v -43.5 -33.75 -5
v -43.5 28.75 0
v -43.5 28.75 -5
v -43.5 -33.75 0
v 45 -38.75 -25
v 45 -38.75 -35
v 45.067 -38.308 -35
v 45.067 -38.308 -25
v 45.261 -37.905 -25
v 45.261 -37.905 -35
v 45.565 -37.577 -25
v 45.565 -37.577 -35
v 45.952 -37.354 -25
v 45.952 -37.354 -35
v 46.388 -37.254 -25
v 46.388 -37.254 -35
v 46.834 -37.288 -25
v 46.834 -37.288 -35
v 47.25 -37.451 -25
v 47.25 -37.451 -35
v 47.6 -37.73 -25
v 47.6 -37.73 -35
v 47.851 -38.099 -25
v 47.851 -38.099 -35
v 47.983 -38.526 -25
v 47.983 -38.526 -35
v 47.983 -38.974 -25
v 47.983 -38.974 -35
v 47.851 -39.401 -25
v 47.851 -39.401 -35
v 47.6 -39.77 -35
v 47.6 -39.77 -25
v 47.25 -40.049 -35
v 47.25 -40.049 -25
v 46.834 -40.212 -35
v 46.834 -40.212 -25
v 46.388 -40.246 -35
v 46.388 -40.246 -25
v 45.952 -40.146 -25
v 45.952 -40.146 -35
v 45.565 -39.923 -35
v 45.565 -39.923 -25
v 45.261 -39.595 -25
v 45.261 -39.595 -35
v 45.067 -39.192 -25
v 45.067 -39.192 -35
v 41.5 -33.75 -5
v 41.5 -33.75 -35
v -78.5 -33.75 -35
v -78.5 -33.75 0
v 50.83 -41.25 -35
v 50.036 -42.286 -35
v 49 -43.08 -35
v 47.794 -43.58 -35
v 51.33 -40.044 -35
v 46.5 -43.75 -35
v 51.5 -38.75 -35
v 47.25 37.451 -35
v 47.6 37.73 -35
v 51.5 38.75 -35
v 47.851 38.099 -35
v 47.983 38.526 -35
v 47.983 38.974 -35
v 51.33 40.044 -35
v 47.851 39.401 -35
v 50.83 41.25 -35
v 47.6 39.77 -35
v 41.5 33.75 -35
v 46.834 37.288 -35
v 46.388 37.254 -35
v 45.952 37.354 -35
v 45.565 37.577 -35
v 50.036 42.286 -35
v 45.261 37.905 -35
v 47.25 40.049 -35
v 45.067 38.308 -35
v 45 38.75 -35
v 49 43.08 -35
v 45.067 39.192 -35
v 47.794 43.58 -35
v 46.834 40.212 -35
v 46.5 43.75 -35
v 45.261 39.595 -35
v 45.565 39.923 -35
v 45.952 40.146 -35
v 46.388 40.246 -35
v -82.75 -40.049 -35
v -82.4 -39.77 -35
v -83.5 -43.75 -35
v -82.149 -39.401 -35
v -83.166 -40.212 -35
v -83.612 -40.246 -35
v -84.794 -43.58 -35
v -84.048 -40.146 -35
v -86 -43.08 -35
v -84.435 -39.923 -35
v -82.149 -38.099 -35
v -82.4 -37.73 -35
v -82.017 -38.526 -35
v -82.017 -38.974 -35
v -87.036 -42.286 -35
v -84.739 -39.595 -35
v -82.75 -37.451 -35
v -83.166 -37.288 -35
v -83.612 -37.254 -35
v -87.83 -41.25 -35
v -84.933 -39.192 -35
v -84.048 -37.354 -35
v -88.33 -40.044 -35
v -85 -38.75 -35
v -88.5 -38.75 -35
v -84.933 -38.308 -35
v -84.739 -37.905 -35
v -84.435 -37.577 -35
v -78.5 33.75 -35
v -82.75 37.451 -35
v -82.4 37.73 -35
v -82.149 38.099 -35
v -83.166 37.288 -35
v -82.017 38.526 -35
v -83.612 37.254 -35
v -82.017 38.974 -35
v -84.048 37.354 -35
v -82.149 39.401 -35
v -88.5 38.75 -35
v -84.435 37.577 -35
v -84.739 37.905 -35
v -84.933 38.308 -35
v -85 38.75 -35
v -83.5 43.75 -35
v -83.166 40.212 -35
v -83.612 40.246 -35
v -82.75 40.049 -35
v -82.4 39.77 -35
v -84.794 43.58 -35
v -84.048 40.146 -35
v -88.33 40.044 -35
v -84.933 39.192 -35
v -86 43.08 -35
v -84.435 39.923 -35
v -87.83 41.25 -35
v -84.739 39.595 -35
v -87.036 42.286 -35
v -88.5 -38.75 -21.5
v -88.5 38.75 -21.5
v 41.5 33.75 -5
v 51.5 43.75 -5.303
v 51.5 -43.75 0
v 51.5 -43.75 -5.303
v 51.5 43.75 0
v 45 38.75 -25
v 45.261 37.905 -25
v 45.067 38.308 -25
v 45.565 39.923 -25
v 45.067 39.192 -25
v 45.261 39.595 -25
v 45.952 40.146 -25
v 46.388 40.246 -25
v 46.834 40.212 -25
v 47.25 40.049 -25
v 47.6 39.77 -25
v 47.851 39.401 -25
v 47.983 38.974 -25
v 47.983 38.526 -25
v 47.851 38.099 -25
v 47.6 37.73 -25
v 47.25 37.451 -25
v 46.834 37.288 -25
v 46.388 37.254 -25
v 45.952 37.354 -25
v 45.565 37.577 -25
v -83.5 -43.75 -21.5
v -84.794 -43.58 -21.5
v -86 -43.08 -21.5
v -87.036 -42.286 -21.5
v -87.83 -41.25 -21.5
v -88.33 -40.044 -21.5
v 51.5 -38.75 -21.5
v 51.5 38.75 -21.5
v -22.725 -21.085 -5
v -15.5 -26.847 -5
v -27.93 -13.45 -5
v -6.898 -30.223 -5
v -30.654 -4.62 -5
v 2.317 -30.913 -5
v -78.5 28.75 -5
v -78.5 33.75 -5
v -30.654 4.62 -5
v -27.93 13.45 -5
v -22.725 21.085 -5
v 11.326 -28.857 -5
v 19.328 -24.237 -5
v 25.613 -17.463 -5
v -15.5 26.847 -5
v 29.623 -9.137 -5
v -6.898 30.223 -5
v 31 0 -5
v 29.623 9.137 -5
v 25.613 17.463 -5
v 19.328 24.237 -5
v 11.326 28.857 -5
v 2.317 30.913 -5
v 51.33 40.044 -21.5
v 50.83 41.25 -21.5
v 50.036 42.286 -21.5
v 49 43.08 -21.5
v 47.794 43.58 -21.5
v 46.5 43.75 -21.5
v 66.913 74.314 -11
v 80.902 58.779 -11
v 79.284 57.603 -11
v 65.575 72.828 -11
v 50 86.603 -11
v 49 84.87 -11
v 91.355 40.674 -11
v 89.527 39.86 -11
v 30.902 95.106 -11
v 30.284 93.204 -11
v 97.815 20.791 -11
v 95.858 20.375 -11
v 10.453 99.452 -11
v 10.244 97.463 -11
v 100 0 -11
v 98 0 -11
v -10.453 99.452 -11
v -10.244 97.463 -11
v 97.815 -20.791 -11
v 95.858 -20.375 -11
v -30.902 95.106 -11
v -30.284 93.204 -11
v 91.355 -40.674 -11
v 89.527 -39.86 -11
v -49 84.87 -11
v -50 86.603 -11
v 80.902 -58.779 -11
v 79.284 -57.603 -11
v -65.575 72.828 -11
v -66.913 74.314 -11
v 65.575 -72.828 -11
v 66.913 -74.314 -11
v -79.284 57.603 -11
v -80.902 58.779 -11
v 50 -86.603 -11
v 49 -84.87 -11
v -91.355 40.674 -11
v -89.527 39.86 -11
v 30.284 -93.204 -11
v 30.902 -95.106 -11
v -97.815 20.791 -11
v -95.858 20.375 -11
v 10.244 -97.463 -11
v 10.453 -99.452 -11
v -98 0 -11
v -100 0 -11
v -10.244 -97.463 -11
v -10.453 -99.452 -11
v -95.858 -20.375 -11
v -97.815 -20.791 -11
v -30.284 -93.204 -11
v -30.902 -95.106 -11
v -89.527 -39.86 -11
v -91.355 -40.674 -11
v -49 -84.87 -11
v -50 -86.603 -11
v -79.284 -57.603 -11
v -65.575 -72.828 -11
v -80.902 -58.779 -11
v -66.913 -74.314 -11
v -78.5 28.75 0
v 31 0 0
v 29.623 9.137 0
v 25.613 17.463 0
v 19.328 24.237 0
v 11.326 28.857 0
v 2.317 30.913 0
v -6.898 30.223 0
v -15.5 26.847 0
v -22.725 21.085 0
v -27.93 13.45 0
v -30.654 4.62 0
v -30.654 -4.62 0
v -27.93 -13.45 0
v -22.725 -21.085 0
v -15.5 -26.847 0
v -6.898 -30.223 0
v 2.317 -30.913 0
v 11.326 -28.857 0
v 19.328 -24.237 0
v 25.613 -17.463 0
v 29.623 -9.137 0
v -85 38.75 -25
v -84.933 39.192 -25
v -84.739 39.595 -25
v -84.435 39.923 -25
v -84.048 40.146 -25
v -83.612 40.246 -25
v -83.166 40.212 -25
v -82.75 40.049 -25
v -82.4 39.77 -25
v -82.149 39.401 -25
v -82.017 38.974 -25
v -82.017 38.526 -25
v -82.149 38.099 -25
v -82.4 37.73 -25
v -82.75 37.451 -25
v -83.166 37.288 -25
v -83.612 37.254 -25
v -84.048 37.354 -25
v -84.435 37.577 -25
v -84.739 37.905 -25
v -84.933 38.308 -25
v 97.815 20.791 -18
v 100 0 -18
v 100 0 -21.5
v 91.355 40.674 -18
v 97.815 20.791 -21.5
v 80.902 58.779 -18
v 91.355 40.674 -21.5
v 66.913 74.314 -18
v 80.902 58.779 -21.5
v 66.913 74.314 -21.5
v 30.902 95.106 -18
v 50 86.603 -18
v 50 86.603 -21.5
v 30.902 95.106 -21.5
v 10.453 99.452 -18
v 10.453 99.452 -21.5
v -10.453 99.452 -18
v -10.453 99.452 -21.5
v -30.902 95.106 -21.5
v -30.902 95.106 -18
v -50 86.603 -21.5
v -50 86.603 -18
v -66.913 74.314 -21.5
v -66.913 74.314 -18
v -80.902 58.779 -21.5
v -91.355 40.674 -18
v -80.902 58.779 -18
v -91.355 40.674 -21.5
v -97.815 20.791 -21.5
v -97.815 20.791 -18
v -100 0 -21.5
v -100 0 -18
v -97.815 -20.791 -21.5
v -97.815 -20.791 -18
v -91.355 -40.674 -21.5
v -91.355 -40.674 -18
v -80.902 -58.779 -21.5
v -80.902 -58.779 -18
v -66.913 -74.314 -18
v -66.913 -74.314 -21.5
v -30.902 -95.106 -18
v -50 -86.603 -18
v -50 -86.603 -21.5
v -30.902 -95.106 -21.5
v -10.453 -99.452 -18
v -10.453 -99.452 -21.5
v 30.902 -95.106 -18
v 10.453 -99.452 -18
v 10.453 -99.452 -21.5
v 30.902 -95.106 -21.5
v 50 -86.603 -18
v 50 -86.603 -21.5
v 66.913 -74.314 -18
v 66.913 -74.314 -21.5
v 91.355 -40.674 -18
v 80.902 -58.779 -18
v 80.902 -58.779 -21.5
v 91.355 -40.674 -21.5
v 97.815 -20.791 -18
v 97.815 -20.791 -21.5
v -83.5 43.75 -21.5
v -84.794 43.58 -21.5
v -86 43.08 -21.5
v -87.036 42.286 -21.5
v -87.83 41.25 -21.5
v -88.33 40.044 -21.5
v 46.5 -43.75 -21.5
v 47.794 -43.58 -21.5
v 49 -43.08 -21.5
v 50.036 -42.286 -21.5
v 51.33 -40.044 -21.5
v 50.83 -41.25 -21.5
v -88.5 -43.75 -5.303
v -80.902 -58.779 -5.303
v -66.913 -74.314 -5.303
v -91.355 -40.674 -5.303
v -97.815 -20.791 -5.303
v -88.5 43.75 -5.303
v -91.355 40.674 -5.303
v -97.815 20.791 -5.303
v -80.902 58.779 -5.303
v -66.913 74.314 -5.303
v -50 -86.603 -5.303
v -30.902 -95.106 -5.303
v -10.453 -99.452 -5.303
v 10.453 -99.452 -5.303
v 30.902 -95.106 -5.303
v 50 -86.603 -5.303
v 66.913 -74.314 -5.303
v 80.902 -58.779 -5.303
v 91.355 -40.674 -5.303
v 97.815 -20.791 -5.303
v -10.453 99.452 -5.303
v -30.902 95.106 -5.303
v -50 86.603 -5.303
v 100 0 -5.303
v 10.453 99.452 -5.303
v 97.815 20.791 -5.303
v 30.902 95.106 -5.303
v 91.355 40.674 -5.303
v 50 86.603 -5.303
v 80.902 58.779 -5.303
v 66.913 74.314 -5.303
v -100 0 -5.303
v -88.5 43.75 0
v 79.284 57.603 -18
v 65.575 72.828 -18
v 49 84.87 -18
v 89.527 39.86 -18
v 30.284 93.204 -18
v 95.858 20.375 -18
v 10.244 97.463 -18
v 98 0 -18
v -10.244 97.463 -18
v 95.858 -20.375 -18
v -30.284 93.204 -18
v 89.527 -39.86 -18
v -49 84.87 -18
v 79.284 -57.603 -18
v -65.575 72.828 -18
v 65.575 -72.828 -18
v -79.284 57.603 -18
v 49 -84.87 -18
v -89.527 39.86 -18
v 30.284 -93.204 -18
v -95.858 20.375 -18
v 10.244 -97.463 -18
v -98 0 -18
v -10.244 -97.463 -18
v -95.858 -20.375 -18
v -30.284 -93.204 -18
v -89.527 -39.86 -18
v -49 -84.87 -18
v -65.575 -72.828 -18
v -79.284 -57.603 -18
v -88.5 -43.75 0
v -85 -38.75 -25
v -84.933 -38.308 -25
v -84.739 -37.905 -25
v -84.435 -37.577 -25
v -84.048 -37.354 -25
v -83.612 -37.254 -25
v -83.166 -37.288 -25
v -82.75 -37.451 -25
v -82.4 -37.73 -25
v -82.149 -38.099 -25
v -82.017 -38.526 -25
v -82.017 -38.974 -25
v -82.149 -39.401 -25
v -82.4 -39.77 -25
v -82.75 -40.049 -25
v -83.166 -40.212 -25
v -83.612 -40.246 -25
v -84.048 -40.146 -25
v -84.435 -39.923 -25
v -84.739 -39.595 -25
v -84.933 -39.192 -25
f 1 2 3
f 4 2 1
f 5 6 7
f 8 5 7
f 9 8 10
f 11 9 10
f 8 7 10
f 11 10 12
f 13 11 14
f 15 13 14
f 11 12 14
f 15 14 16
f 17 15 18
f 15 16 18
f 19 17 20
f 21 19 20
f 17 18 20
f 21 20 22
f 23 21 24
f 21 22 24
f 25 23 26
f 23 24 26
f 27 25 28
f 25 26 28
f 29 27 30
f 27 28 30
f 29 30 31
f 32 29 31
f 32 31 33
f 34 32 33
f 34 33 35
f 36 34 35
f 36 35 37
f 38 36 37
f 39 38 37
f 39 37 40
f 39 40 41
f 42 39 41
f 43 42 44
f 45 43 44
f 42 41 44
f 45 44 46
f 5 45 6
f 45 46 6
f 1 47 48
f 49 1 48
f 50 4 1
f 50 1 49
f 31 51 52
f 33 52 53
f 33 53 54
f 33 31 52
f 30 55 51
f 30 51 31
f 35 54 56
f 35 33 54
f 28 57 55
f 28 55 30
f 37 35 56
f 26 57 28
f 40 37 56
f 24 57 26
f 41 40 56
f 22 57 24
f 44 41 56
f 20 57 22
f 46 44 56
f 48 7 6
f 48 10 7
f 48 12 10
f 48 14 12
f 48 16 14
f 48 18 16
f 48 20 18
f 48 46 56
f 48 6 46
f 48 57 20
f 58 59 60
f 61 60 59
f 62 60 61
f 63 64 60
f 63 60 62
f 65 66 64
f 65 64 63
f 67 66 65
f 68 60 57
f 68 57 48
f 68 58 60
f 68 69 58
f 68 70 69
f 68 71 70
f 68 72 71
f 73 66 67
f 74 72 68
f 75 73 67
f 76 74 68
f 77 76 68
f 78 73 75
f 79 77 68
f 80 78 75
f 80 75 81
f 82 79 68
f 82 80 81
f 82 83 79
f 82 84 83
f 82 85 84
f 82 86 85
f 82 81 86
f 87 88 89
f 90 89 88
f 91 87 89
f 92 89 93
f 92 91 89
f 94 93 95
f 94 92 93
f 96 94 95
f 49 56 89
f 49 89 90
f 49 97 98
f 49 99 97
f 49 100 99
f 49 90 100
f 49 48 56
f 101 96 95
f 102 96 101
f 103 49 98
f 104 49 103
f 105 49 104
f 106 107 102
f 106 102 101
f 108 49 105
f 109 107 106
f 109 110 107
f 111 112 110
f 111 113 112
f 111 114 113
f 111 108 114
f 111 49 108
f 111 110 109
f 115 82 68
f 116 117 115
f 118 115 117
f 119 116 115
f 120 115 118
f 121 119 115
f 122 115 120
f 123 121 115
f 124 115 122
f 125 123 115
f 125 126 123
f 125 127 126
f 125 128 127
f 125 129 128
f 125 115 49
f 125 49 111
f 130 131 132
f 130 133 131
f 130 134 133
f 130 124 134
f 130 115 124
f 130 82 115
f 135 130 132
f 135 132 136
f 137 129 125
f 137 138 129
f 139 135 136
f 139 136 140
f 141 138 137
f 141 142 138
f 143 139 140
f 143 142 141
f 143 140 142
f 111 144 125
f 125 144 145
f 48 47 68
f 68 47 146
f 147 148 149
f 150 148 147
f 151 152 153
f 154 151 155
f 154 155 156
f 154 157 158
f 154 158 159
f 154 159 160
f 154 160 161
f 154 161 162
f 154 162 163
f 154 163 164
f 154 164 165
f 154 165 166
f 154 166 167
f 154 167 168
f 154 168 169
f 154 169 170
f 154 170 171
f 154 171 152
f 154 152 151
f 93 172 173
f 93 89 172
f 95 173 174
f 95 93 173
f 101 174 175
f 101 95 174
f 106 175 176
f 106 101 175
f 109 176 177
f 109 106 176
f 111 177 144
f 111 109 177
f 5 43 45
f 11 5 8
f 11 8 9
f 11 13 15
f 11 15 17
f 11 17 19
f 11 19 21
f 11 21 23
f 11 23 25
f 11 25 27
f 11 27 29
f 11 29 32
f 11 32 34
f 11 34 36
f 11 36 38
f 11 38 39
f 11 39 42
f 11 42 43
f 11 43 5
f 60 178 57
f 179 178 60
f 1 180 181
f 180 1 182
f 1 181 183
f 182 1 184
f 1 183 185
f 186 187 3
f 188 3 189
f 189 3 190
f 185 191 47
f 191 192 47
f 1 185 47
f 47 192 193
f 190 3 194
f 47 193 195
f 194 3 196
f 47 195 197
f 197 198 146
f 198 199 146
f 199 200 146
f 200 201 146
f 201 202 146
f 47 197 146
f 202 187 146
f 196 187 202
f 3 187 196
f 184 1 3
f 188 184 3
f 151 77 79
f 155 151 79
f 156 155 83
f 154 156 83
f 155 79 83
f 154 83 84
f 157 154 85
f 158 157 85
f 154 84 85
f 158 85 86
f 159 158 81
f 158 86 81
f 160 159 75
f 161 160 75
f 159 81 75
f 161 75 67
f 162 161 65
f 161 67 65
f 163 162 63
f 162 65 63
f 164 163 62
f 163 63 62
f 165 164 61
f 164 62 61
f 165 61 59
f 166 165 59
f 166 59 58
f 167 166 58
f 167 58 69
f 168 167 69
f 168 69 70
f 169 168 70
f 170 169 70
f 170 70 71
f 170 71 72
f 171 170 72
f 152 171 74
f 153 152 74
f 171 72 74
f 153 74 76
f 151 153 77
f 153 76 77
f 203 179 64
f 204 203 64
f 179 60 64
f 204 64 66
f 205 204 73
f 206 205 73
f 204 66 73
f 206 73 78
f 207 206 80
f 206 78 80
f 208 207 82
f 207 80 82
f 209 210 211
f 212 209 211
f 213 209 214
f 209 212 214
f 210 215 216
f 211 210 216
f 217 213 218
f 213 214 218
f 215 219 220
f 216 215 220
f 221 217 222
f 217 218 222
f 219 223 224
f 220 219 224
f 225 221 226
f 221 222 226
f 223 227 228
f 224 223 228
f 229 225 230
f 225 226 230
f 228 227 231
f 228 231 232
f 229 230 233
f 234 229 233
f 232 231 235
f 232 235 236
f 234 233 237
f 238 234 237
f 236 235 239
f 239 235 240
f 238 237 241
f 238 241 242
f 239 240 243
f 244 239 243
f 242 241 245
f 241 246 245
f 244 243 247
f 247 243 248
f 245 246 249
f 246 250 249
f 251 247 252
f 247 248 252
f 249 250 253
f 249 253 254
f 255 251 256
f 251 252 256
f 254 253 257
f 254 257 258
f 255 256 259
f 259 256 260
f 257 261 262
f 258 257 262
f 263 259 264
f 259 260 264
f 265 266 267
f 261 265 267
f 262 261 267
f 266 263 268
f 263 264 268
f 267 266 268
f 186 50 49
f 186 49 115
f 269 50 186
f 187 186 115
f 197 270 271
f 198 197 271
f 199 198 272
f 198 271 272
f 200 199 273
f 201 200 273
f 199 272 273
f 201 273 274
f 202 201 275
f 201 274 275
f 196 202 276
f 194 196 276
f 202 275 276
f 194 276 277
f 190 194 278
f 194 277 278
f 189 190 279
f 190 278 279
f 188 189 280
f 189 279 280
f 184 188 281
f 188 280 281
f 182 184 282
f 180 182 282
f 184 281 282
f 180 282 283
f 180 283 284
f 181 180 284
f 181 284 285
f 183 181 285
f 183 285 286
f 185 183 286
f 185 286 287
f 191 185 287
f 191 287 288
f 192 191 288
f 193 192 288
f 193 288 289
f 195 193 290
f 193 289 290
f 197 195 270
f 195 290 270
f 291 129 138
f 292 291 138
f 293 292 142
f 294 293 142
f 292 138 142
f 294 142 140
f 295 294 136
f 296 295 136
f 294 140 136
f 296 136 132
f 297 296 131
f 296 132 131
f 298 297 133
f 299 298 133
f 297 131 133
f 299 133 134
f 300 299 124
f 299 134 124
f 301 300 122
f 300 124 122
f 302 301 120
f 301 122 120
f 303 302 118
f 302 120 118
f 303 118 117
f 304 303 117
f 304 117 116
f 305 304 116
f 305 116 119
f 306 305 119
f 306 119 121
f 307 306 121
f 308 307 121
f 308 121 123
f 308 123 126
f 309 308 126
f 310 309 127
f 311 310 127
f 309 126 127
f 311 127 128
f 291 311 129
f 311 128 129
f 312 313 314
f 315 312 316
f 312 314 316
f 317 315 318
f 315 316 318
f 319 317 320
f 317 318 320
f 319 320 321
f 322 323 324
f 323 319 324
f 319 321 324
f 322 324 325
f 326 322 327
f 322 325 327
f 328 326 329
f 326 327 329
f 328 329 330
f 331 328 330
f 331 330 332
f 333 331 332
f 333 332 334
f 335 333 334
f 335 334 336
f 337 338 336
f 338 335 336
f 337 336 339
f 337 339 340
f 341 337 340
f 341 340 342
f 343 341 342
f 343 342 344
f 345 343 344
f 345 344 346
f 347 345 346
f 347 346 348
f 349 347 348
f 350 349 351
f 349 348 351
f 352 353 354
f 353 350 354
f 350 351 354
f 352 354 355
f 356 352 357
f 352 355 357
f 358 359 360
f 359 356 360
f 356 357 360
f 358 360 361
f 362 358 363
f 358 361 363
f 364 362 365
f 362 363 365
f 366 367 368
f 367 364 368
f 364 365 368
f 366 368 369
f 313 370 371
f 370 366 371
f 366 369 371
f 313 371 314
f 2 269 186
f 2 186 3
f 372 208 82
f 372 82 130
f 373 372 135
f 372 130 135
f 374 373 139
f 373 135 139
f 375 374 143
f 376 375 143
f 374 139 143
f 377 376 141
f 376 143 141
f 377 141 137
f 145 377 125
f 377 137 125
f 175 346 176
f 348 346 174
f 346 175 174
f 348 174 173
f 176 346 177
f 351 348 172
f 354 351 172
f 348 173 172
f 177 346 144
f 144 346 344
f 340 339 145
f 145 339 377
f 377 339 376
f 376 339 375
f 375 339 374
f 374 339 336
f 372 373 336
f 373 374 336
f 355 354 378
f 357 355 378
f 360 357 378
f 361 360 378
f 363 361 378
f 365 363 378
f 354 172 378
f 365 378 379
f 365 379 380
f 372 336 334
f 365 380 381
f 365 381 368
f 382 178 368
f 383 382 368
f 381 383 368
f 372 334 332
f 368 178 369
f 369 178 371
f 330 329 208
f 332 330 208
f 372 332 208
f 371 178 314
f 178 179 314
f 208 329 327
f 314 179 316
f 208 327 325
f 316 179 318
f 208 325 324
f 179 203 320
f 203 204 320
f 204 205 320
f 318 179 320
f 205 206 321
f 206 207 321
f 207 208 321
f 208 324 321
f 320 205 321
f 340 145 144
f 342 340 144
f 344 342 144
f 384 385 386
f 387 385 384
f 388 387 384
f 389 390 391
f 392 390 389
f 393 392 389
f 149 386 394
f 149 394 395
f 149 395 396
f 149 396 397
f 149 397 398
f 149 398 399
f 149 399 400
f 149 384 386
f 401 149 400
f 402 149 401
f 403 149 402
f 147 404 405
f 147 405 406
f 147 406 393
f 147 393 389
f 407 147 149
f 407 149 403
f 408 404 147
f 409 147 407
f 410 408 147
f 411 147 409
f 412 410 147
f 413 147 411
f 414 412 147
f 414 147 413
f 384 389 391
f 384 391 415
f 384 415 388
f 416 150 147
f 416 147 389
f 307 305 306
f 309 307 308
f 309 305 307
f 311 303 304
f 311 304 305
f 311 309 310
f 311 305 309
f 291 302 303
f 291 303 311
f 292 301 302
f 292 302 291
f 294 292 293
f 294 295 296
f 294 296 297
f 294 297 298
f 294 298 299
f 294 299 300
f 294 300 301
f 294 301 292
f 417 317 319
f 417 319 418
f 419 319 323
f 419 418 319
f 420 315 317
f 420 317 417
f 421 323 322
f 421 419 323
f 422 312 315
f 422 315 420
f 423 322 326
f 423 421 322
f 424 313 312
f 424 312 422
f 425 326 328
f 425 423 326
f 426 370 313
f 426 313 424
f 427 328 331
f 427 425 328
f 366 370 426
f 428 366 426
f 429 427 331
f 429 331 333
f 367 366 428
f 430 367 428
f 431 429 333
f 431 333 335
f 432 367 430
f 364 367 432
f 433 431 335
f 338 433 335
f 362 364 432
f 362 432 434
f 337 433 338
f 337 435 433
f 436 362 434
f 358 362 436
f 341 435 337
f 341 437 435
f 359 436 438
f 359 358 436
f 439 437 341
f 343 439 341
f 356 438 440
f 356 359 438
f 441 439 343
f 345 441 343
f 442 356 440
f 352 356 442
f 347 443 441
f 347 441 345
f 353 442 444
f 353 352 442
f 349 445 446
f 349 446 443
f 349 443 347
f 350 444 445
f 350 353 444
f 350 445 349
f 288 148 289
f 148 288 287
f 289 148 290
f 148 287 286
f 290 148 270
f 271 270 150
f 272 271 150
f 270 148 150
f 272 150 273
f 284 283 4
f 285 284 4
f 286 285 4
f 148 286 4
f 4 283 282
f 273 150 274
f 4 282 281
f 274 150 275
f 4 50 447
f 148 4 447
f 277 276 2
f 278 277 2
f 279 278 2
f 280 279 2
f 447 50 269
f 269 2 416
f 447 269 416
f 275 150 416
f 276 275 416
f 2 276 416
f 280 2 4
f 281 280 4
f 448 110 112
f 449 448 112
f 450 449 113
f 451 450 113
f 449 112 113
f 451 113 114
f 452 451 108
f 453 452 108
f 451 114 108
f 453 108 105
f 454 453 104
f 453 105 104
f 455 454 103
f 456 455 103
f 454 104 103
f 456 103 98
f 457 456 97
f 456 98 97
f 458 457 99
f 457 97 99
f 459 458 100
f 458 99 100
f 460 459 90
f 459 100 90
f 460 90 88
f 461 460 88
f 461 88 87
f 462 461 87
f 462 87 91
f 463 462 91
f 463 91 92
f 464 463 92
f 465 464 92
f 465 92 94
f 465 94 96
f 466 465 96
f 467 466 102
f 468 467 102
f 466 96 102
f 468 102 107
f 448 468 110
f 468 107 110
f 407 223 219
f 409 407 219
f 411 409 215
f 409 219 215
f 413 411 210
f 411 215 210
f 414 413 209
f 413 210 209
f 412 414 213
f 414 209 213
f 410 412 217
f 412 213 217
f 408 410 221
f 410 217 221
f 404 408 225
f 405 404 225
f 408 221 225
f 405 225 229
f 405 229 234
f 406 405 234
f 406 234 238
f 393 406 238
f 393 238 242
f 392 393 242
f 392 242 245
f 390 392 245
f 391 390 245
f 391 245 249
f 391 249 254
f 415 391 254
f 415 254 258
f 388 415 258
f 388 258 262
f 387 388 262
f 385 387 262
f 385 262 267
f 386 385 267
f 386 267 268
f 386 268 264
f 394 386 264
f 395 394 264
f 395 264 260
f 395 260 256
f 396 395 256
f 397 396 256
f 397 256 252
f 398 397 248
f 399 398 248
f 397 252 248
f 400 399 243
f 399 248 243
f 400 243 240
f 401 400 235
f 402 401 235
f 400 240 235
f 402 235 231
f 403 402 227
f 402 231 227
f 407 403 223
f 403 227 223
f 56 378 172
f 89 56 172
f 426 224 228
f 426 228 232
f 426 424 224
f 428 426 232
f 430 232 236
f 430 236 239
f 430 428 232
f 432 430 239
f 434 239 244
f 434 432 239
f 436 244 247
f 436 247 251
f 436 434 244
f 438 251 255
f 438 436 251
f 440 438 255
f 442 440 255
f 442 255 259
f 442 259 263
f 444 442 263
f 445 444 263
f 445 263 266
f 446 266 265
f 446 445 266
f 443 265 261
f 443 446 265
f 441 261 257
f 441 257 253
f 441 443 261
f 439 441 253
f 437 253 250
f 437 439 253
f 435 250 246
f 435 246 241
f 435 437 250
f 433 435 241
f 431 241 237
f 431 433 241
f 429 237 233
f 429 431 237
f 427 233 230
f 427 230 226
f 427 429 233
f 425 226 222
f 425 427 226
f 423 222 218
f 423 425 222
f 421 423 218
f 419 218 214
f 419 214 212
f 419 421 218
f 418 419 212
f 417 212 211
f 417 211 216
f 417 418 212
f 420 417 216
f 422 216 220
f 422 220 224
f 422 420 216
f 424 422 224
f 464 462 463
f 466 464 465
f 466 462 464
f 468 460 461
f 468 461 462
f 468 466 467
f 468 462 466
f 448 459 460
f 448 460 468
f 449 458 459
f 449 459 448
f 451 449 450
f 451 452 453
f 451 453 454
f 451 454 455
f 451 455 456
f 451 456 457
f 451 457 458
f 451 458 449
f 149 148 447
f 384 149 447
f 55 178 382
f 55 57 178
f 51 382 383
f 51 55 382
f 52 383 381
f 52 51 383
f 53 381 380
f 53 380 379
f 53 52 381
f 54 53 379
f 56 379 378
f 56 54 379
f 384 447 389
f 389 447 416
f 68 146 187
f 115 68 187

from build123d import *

# Parameters (mm, degrees)
SKETCH1_R                = 31
BOSS_EXTRUDE1_DEPTH      = 5
BOSS_EXTRUDE2_DEPTH      = 30
BOSS_EXTRUDE2_DEPTH_BACK = 5
SKETCH2_W                = 140
SKETCH2_H                = 87.5
SKETCH2_W_2              = 120
SKETCH2_H_2              = 67.5
BOSS_EXTRUDE3_START      = -6.5
BOSS_EXTRUDE3_OUTLINE_R  = 100
BOSS_EXTRUDE3_OUTLINE_W  = 140
BOSS_EXTRUDE3_OUTLINE_H  = 87.5
BOSS_EXTRUDE3_DEPTH      = 16.196699026
SKETCH4_W                = 7
SKETCH4_H                = 2
FILLET1_R                = 5
SKETCH5_R                = 1.5
CUT_EXTRUDE1_DEPTH       = 10


# Read off the part's stored shape, not the designer's step: Boss-Extrude3
with BuildPart() as part:
    # Sketch1 → Boss-Extrude1 (new body)
    with BuildSketch(Plane.XY):
        Polygon((41.5, 33.75), (-78.5, 33.75), (-78.5, 28.75), (-43.5, 28.75), (-43.5, -33.75), (41.5, -33.75), align=None)
        Circle(SKETCH1_R, mode=Mode.SUBTRACT)
    extrude(amount=-BOSS_EXTRUDE1_DEPTH)

    # Sketch2 → Boss-Extrude2 (add, two sides: drawn at the far end of the back side and taken through both)
    with BuildSketch(Plane(origin=(0, 0, -5), x_dir=(-1, 0, 0), z_dir=(0, 0, -1)).offset(-BOSS_EXTRUDE2_DEPTH_BACK)):
        with Locations((18.5, 0)):
            Rectangle(SKETCH2_W, SKETCH2_H)
        with Locations((18.5, 0)):
            Rectangle(SKETCH2_W_2, SKETCH2_H_2, mode=Mode.SUBTRACT)
    extrude(amount=BOSS_EXTRUDE2_DEPTH + BOSS_EXTRUDE2_DEPTH_BACK)

    # Boss-Extrude3 outline → Boss-Extrude3 (add)
    with BuildSketch(Plane.XY.offset(-15).offset(BOSS_EXTRUDE3_START)):
        Circle(BOSS_EXTRUDE3_OUTLINE_R)
        with Locations((-18.5, 0)):
            Rectangle(BOSS_EXTRUDE3_OUTLINE_W, BOSS_EXTRUDE3_OUTLINE_H, mode=Mode.SUBTRACT)
    extrude(amount=BOSS_EXTRUDE3_DEPTH)

    # Sketch4 → Cut-Revolve1 (revolve, cut)
    with BuildSketch(Plane(origin=(0, 0, 0), x_dir=(0, 0, -1), z_dir=(1, 0, 0)), mode=Mode.PRIVATE) as cut_revolve1_sk:
        with Locations((14.5, 99)):
            Rectangle(SKETCH4_W, SKETCH4_H)
    revolve(cut_revolve1_sk.sketch.rotate(Axis((0, 0, 0), (0, 0, -1)), 90), axis=Axis((0, 0, 0), (0, 0, -1)), mode=Mode.SUBTRACT)

    # Fillet1
    fillet1_edges = [part.edges().sort_by_distance(p)[0] for p in [
        (-88.5, -43.75, -28.25),
        (51.5, -43.75, -28.25),
        (-88.5, 43.75, -28.25),
        (51.5, 43.75, -28.25),
    ]]
    fillet(fillet1_edges, radius=FILLET1_R)

    # Sketch5 → Cut-Extrude1 (cut)
    with BuildSketch(Plane(origin=(0, 0, -35), x_dir=(-1, 0, 0), z_dir=(0, 0, -1))):
        with Locations((-46.5, 38.75)):
            Circle(SKETCH5_R)
        with Locations((-46.5, -38.75)):
            Circle(SKETCH5_R)
        with Locations((83.5, -38.75)):
            Circle(SKETCH5_R)
        with Locations((83.5, 38.75)):
            Circle(SKETCH5_R)
    extrude(amount=-CUT_EXTRUDE1_DEPTH, mode=Mode.SUBTRACT)


solid = part.part
